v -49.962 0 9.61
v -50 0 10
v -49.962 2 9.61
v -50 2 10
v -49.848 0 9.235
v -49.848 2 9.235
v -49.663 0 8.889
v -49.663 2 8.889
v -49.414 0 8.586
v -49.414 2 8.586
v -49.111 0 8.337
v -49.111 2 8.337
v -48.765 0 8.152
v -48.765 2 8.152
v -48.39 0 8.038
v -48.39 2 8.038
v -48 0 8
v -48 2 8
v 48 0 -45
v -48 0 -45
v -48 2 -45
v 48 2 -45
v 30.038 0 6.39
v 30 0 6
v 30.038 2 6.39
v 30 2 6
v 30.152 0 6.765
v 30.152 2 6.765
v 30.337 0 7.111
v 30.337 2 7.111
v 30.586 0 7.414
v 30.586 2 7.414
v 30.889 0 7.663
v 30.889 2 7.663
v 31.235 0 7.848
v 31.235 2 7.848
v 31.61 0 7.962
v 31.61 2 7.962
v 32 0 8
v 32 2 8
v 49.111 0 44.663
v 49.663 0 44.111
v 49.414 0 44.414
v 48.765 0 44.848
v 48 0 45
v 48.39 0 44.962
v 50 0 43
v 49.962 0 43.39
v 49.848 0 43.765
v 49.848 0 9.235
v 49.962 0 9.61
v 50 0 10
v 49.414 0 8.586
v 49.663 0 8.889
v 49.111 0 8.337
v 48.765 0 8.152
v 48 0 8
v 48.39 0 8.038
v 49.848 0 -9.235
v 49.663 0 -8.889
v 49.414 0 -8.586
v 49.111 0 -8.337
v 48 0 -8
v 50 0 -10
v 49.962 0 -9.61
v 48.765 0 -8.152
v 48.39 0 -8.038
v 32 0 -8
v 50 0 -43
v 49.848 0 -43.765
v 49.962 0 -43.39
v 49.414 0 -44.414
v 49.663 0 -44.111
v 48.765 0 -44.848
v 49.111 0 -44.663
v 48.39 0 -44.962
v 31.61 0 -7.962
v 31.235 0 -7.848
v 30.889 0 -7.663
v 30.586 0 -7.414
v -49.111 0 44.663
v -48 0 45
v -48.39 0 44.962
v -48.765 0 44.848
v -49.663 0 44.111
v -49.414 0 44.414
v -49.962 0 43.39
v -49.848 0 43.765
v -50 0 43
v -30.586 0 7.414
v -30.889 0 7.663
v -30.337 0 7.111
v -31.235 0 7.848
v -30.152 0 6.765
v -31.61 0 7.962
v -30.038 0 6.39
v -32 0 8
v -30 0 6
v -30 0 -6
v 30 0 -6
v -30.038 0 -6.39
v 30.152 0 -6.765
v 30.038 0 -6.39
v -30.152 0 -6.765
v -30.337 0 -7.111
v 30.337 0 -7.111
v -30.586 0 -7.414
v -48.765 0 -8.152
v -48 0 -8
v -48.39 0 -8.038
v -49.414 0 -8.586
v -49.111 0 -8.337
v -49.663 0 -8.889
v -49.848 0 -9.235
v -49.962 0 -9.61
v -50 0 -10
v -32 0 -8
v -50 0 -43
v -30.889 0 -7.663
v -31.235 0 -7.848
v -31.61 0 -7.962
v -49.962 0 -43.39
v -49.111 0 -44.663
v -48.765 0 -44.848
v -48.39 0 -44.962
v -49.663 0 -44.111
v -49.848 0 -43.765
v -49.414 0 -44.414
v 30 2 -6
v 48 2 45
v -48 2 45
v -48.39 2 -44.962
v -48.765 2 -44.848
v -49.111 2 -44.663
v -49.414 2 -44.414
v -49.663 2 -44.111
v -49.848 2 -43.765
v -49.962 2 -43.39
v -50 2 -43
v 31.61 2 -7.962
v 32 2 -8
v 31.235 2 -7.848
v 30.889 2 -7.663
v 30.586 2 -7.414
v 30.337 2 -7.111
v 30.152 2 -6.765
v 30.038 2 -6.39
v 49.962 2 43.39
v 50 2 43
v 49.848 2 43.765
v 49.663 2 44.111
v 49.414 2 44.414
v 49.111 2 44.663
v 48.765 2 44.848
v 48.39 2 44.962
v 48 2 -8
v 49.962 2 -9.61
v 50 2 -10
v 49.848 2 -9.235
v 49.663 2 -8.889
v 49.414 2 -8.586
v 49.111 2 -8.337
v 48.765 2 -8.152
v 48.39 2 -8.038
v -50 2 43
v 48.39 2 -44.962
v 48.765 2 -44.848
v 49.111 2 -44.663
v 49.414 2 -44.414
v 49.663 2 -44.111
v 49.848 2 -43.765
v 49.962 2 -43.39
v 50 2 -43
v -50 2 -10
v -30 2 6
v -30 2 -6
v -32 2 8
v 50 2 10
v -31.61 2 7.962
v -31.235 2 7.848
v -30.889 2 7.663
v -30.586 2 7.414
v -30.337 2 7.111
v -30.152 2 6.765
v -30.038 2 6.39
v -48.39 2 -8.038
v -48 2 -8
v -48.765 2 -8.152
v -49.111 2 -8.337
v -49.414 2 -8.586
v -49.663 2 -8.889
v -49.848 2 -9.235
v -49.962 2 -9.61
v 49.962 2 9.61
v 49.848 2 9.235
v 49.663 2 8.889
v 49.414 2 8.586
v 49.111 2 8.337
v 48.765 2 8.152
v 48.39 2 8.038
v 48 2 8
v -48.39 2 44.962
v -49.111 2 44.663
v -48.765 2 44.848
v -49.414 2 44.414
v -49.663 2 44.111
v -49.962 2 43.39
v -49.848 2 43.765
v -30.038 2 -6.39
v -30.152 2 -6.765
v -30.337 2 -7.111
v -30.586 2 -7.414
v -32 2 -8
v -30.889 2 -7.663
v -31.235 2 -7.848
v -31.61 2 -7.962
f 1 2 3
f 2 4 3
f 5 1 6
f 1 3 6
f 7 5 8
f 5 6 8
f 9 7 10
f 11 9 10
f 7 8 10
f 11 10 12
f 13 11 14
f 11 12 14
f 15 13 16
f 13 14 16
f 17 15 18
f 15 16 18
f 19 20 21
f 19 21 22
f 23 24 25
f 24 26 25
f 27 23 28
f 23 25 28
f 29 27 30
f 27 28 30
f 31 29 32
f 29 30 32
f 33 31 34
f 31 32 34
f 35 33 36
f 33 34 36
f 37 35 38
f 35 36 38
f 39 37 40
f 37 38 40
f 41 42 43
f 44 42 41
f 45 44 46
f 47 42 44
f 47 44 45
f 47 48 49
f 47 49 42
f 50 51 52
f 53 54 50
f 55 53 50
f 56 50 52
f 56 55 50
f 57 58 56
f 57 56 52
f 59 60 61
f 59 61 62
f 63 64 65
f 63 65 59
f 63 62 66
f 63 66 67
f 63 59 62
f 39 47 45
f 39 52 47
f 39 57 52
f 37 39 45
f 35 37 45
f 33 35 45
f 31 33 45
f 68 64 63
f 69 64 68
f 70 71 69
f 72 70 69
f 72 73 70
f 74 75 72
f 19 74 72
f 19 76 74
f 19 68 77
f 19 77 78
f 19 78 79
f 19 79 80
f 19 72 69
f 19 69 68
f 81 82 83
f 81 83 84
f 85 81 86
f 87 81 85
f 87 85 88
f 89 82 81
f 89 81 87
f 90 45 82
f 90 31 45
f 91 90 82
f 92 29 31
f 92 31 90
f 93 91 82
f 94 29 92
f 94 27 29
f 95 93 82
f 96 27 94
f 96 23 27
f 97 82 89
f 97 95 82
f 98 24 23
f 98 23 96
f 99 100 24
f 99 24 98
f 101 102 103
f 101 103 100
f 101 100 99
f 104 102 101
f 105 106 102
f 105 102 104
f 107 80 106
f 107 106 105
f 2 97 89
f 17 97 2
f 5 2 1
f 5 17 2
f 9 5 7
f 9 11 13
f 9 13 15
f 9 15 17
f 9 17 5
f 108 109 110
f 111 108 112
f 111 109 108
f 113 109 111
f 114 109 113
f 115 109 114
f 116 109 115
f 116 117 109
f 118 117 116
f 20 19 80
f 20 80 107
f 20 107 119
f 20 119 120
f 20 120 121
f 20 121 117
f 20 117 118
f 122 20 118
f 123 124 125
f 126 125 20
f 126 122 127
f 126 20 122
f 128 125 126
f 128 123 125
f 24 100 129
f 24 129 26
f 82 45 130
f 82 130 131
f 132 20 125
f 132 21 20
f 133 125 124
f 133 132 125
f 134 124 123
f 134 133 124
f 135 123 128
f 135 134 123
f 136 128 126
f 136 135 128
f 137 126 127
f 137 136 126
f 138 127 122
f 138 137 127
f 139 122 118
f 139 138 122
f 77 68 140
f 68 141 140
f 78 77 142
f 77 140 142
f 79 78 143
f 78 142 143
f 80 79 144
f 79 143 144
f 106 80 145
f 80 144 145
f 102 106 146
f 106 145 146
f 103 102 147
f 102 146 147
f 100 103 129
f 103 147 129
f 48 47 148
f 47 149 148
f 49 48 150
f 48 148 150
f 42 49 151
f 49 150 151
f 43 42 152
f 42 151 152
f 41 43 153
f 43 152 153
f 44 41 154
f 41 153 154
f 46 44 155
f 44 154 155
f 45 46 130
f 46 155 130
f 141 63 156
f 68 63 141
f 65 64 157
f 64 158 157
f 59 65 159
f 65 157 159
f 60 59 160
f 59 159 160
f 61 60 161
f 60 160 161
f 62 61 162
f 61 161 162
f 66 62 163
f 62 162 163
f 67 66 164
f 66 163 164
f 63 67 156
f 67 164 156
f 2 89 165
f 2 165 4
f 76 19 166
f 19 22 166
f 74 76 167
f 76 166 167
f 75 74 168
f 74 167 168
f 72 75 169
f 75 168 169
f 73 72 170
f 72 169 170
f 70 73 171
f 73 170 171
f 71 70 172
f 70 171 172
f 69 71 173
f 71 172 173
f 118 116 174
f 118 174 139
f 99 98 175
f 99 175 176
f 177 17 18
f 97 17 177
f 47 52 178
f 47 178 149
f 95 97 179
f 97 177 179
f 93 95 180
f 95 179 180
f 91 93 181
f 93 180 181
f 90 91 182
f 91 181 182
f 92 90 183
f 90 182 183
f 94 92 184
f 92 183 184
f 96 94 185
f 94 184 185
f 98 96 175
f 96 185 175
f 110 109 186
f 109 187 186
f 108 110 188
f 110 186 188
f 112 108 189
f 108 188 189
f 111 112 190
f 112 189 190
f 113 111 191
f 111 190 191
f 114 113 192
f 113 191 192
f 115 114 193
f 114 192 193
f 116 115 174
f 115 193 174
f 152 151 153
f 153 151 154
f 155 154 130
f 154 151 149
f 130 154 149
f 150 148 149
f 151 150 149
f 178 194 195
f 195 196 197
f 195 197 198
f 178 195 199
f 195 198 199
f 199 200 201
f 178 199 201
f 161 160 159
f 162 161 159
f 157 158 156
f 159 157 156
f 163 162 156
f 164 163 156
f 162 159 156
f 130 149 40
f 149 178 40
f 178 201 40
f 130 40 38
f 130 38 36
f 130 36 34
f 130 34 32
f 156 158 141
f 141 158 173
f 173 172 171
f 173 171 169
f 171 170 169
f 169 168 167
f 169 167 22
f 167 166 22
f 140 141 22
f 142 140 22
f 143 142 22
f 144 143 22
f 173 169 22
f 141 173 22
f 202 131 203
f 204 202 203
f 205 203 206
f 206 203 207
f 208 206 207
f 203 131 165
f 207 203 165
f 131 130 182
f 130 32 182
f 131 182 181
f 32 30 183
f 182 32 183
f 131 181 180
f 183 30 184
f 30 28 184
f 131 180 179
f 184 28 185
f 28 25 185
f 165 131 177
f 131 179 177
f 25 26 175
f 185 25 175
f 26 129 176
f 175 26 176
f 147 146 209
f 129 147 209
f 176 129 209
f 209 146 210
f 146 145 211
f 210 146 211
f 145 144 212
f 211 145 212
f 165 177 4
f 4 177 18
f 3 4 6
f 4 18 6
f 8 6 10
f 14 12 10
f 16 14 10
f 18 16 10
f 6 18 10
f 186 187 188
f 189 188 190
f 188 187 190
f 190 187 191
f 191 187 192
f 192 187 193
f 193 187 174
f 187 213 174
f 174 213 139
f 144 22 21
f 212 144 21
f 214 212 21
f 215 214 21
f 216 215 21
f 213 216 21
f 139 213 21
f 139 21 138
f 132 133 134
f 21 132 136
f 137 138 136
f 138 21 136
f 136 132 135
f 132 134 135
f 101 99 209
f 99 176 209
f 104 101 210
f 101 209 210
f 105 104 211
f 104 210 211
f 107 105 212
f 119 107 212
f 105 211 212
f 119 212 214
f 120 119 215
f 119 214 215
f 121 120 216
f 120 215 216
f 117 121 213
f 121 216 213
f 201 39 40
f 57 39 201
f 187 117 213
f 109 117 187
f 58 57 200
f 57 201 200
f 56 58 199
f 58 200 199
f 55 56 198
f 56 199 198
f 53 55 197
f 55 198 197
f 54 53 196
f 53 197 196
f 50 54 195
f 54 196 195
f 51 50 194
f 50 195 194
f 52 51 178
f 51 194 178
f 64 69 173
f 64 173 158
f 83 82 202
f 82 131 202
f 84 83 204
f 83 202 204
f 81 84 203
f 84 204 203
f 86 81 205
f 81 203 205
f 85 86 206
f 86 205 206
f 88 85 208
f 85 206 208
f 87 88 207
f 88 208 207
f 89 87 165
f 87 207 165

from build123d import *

# Parameters (mm, degrees)
BOSS_EXTRUDE1_DEPTH = 2
FILLET1_R           = 2


with BuildPart() as part:
    # Sketch2 → Boss-Extrude1 (new body)
    with BuildSketch(Plane(origin=(0, 0, 0), x_dir=(1, 0, 0), z_dir=(0, 1, 0))):
        Polygon((-50, 45), (50, 45), (50, 8), (30, 8), (30, -8), (50, -8), (50, -45), (-50, -45), (-50, -8), (-30, -8), (-30, 8), (-50, 8), align=None)
    extrude(amount=BOSS_EXTRUDE1_DEPTH)

    # Fillet1
    fillet1_edges = [part.edges().sort_by_distance(p)[0] for p in [
        (-50, 1, -45),
        (50, 1, -45),
        (50, 1, -8),
        (30, 1, -8),
        (30, 1, 8),
        (50, 1, 8),
        (50, 1, 45),
        (-50, 1, 45),
        (-50, 1, 8),
        (-30, 1, 8),
        (-30, 1, -8),
        (-50, 1, -8),
    ]]
    fillet(fillet1_edges, radius=FILLET1_R)


solid = part.part
